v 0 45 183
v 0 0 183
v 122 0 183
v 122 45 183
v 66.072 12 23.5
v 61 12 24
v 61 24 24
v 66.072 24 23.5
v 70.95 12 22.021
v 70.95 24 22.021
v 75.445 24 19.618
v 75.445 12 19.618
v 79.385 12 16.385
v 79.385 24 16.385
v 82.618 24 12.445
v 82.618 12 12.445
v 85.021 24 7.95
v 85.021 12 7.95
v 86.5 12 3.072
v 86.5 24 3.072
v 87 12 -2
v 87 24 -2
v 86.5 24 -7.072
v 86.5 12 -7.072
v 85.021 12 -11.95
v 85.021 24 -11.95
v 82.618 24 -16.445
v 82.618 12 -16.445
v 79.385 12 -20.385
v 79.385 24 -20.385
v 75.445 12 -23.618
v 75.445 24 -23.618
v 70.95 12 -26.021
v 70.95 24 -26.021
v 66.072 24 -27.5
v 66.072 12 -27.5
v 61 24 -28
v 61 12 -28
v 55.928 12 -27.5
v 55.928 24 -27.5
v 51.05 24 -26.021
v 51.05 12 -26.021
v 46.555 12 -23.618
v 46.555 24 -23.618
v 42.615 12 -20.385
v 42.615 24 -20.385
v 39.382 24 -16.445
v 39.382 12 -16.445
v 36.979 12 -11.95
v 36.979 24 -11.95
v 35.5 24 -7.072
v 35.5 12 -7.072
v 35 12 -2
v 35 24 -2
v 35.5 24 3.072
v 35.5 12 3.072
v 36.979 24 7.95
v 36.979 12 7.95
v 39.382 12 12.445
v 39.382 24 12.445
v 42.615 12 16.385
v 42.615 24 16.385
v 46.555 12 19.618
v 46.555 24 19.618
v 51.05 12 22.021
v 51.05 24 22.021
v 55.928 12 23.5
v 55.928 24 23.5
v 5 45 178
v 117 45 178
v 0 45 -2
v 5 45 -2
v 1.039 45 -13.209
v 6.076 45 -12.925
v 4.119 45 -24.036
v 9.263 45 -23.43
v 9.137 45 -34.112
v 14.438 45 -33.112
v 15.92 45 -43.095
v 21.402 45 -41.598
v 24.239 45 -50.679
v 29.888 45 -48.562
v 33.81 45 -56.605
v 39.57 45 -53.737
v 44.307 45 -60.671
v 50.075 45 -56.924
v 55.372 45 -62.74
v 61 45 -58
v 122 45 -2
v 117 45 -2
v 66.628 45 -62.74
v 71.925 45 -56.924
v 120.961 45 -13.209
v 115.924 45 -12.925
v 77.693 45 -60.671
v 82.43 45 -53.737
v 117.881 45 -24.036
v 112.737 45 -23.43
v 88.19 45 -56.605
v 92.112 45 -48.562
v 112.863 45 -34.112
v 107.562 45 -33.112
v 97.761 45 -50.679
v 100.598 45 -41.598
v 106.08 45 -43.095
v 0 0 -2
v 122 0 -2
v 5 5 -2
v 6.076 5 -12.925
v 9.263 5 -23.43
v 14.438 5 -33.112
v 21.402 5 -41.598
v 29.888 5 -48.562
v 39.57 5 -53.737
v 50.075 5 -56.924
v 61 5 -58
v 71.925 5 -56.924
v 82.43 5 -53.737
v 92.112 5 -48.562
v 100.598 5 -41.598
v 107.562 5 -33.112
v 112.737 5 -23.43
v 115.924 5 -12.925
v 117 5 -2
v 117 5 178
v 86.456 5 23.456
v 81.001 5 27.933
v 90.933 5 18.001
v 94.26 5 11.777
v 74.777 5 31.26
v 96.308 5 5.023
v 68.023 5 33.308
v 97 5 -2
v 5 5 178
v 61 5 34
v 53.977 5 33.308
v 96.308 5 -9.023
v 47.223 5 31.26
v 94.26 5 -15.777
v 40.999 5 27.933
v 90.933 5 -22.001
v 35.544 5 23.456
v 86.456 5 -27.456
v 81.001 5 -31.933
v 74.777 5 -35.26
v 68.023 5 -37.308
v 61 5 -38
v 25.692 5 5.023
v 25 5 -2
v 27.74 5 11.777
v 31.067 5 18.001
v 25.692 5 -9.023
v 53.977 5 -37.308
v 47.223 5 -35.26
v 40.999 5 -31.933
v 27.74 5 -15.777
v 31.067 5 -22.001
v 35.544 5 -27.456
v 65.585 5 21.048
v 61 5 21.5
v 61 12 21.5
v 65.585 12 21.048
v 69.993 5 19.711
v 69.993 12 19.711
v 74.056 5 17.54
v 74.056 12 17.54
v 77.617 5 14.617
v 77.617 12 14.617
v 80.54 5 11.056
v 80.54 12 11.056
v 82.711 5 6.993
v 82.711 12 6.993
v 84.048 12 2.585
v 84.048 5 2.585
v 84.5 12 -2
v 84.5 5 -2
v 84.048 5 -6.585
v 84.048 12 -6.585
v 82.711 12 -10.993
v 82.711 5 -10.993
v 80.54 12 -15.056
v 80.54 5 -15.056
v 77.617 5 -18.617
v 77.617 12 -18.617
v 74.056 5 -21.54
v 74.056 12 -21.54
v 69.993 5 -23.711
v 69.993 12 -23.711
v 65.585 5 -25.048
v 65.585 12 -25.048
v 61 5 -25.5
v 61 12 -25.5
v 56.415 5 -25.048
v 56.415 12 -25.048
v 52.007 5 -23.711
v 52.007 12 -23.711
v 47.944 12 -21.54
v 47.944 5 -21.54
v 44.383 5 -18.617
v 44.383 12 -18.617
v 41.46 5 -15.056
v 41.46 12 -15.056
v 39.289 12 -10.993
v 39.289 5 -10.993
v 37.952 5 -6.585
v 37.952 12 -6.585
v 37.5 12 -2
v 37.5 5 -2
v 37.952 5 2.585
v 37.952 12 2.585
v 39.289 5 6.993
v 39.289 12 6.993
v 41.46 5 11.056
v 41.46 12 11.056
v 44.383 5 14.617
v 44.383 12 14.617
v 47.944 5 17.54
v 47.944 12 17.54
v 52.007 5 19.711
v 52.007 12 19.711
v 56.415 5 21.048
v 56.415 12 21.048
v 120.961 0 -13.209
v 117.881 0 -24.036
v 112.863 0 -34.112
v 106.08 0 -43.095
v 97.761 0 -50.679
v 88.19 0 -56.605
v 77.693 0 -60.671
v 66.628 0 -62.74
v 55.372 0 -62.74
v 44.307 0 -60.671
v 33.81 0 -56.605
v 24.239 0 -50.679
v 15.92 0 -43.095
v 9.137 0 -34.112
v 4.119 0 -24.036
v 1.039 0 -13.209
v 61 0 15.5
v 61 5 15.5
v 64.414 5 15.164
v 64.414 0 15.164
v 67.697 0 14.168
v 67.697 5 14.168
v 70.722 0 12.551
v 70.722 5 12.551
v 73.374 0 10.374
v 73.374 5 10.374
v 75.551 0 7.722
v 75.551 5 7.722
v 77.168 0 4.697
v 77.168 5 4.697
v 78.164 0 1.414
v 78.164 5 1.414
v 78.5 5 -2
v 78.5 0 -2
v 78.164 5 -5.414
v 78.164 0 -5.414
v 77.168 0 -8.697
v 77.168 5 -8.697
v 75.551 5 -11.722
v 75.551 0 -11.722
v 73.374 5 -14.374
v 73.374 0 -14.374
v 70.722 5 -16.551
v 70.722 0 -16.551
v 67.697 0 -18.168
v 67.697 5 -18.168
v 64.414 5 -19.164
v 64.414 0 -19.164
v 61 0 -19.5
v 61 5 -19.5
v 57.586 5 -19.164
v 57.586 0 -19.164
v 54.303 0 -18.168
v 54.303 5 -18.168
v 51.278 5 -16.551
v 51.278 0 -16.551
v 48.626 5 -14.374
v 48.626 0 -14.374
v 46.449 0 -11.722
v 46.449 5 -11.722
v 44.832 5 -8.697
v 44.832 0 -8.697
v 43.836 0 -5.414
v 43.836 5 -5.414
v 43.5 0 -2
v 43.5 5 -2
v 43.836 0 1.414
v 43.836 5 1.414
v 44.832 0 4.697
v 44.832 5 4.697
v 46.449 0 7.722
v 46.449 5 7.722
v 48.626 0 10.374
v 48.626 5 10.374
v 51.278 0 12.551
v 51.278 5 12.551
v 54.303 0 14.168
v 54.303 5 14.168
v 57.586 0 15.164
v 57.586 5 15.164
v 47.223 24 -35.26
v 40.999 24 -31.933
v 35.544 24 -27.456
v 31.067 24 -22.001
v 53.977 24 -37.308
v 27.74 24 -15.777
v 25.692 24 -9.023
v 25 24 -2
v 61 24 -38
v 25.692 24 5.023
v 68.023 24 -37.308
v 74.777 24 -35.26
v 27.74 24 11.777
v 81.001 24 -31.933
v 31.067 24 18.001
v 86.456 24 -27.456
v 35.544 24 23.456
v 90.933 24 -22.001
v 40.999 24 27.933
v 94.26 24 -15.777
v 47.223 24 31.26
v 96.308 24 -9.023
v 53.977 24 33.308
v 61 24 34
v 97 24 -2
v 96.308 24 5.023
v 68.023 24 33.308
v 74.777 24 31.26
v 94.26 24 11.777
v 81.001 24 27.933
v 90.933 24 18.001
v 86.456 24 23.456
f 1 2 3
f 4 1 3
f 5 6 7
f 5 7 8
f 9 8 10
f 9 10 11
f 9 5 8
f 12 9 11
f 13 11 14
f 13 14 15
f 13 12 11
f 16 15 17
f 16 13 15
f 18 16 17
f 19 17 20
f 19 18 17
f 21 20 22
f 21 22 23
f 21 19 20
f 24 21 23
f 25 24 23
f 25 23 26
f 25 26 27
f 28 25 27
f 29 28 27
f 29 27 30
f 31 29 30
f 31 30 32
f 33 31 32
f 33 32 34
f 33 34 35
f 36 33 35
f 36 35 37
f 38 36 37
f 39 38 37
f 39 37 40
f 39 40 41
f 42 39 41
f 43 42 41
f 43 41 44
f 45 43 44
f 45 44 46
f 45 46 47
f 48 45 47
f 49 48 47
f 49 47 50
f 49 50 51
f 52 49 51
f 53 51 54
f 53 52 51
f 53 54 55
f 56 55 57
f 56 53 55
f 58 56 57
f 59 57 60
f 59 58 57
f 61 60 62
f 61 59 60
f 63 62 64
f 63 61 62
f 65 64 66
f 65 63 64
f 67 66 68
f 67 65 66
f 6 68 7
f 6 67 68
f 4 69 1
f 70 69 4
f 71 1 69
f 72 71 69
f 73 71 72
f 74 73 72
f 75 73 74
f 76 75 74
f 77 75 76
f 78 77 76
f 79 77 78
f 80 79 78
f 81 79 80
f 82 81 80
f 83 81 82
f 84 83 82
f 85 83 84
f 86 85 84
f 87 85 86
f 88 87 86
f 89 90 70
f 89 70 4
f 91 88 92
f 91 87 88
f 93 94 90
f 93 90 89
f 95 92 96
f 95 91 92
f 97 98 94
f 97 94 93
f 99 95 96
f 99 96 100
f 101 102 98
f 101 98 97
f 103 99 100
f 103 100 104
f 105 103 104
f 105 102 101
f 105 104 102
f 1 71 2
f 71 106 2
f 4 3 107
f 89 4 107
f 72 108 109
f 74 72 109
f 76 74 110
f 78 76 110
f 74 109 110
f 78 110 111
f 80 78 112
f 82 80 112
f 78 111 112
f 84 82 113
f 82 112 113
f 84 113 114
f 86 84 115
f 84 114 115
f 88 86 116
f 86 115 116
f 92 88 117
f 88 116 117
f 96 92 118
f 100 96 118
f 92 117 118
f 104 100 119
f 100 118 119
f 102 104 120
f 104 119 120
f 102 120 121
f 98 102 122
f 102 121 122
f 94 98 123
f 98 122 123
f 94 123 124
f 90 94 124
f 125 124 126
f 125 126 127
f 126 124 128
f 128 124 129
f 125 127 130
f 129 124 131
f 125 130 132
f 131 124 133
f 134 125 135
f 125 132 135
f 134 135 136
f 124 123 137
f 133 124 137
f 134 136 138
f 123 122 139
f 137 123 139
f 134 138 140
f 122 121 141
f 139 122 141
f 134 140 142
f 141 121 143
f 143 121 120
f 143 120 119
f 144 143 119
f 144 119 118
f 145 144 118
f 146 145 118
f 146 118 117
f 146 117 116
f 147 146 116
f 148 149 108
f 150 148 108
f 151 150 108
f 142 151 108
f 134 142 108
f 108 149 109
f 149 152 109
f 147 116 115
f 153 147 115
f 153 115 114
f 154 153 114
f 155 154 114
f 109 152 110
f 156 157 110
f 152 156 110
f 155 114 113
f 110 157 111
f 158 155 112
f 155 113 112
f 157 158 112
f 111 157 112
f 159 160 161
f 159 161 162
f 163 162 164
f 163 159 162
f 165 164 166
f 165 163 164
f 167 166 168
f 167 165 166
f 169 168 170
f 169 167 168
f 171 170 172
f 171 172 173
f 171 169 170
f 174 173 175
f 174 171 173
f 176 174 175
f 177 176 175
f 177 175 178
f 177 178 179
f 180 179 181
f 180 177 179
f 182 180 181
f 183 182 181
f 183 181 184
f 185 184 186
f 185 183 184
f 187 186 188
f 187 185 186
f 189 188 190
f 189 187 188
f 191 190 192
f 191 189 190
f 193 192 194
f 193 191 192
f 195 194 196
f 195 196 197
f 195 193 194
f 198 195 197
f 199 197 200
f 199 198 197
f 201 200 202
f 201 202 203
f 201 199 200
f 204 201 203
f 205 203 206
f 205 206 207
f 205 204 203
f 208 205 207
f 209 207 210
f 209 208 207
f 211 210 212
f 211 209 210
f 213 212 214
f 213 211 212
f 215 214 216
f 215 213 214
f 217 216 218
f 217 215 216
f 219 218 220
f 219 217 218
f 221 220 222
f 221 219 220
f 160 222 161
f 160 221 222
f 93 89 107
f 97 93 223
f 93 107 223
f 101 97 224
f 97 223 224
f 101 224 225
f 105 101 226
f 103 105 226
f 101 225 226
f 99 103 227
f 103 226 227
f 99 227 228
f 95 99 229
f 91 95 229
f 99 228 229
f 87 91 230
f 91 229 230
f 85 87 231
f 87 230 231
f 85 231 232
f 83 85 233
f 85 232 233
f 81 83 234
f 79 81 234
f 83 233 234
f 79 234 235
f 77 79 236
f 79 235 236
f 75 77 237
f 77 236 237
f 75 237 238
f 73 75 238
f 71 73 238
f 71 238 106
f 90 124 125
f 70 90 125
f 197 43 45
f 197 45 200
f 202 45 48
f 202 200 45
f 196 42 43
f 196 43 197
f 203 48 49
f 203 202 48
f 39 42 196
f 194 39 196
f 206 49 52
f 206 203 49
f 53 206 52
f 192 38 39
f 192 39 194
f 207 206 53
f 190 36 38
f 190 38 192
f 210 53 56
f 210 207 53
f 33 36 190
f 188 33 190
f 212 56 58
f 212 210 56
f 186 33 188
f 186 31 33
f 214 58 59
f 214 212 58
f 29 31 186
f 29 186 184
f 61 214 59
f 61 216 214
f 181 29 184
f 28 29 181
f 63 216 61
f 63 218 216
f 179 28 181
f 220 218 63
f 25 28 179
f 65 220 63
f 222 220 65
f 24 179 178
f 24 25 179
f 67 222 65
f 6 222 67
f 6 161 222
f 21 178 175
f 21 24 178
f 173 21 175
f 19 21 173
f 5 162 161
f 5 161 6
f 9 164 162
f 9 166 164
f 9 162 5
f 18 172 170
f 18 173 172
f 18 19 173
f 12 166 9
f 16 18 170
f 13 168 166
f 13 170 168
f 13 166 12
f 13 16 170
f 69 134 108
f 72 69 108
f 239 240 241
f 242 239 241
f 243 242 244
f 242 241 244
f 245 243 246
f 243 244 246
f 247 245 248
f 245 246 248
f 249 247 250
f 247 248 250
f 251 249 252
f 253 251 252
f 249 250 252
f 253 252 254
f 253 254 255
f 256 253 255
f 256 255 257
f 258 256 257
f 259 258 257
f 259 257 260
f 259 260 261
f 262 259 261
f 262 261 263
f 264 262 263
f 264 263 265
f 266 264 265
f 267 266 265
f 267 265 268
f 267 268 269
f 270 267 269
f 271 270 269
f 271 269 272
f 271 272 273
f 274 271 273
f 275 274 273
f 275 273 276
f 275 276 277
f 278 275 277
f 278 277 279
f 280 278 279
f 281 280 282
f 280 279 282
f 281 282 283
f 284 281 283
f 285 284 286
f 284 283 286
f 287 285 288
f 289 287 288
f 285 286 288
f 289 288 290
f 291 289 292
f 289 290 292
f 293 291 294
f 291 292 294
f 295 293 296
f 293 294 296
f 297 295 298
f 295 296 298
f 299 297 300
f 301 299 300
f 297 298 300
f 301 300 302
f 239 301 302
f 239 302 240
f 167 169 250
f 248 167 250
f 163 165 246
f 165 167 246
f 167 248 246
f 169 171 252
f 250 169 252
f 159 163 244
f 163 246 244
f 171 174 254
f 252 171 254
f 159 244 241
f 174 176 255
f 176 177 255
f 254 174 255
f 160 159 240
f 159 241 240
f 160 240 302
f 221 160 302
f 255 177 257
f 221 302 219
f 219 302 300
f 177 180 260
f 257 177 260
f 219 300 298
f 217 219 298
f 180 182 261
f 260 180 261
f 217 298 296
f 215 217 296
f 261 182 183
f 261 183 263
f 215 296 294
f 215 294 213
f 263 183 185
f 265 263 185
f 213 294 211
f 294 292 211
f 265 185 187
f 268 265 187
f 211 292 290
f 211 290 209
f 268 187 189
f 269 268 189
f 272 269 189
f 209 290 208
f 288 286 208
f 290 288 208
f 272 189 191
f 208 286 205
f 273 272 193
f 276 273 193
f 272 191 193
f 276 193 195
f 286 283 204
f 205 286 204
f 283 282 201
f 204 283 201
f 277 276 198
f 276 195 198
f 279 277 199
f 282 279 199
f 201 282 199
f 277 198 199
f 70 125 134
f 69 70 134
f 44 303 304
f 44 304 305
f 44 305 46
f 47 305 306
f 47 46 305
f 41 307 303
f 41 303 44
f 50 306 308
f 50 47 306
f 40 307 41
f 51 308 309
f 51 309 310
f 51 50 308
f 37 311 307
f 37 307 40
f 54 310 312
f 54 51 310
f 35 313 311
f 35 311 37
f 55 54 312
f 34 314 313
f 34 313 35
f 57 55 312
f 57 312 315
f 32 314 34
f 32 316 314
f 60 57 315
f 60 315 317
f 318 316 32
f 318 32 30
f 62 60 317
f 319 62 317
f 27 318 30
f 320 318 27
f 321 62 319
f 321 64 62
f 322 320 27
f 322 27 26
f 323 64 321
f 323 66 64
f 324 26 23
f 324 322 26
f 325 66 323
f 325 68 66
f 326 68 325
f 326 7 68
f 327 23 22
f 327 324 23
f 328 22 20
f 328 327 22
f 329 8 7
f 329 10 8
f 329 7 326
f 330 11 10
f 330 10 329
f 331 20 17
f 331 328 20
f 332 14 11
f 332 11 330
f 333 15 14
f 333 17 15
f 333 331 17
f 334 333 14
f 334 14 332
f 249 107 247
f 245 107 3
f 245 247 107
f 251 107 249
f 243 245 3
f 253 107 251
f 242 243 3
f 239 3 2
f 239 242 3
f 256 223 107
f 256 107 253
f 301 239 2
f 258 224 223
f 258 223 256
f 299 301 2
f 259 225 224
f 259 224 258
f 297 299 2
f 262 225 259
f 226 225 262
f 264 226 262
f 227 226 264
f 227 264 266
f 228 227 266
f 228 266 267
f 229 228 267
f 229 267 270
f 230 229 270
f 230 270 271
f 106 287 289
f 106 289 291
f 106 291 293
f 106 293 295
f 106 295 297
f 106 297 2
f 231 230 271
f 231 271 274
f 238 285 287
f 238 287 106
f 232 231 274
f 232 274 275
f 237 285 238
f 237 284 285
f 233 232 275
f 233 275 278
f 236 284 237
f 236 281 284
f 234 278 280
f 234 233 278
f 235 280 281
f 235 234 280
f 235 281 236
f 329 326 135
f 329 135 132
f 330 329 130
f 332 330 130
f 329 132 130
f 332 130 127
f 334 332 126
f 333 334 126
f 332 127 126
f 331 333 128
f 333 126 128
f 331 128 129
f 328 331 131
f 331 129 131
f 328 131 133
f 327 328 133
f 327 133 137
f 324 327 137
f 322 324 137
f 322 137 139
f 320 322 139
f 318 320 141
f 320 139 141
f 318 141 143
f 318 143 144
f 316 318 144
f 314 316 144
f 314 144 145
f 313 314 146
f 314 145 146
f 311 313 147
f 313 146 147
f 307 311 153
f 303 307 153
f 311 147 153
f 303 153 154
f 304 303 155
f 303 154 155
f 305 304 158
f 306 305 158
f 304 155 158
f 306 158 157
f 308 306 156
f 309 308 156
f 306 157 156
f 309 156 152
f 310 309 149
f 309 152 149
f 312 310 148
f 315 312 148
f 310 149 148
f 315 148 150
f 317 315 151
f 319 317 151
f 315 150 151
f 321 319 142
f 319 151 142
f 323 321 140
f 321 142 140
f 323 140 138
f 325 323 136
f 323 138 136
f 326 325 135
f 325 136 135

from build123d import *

# Parameters (mm, degrees)
BOSS_EXTRUDE2_DEPTH = 5
BOSS_EXTRUDE3_DEPTH = 40
SKETCH4_R           = 17.5
CUT_EXTRUDE1_DEPTH  = 40
SKETCH5_R           = 26
SKETCH5_R_2         = 23.5
BOSS_EXTRUDE4_DEPTH = 7
SKETCH6_R           = 36
SKETCH6_R_2         = 26
BOSS_EXTRUDE5_DEPTH = 19


with BuildPart() as part:
    # Sketch1 → Boss-Extrude2 (new body)
    with BuildSketch(Plane(origin=(0, 0, 0), x_dir=(1, 0, 0), z_dir=(0, 1, 0))):
        with BuildLine():
            Line((122, -183), (0, -183))
            Line((0, -183), (0, 2))
            ThreePointArc((0, 2), (61, 63), (122, 2))
            Line((122, 2), (122, -183))
        make_face()
    extrude(amount=BOSS_EXTRUDE2_DEPTH)

    # Sketch3 → Boss-Extrude3 (add)
    with BuildSketch(Plane(origin=(0, 5, 0), x_dir=(1, 0, 0), z_dir=(0, 1, 0))):
        with BuildLine():
            Line((122, -183), (122, 2))
            ThreePointArc((122, 2), (61, 63), (0, 2))
            Line((0, 2), (0, -183))
            Line((0, -183), (122, -183))
        make_face()
        with BuildLine():
            Line((5, -178), (5, 2))
            ThreePointArc((5, 2), (61, 58), (117, 2))
            Line((117, 2), (117, -178))
            Line((117, -178), (5, -178))
        make_face(mode=Mode.SUBTRACT)
    extrude(amount=BOSS_EXTRUDE3_DEPTH)

    # Sketch4 → Cut-Extrude1 (cut)
    with BuildSketch(Plane(origin=(0, 5, 0), x_dir=(1, 0, 0), z_dir=(0, 1, 0))):
        with Locations(Location((61, 2, 0), (0, 0, 270))):
            Circle(SKETCH4_R)
    extrude(amount=-CUT_EXTRUDE1_DEPTH, mode=Mode.SUBTRACT)

    # Sketch5 → Boss-Extrude4 (add)
    with BuildSketch(Plane(origin=(0, 5, 0), x_dir=(1, 0, 0), z_dir=(0, 1, 0))):
        with Locations(Location((61, 2, 0), (0, 0, 270))):
            Circle(SKETCH5_R)
        with Locations(Location((61, 2, 0), (0, 0, 270))):
            Circle(SKETCH5_R_2, mode=Mode.SUBTRACT)
    extrude(amount=BOSS_EXTRUDE4_DEPTH)

    # Sketch6 → Boss-Extrude5 (add)
    with BuildSketch(Plane(origin=(0, 5, 0), x_dir=(1, 0, 0), z_dir=(0, 1, 0))):
        with Locations(Location((61, 2, 0), (0, 0, 270))):
            Circle(SKETCH6_R)
        with Locations(Location((61, 2, 0), (0, 0, 270))):
            Circle(SKETCH6_R_2, mode=Mode.SUBTRACT)
    extrude(amount=BOSS_EXTRUDE5_DEPTH)


solid = part.part
